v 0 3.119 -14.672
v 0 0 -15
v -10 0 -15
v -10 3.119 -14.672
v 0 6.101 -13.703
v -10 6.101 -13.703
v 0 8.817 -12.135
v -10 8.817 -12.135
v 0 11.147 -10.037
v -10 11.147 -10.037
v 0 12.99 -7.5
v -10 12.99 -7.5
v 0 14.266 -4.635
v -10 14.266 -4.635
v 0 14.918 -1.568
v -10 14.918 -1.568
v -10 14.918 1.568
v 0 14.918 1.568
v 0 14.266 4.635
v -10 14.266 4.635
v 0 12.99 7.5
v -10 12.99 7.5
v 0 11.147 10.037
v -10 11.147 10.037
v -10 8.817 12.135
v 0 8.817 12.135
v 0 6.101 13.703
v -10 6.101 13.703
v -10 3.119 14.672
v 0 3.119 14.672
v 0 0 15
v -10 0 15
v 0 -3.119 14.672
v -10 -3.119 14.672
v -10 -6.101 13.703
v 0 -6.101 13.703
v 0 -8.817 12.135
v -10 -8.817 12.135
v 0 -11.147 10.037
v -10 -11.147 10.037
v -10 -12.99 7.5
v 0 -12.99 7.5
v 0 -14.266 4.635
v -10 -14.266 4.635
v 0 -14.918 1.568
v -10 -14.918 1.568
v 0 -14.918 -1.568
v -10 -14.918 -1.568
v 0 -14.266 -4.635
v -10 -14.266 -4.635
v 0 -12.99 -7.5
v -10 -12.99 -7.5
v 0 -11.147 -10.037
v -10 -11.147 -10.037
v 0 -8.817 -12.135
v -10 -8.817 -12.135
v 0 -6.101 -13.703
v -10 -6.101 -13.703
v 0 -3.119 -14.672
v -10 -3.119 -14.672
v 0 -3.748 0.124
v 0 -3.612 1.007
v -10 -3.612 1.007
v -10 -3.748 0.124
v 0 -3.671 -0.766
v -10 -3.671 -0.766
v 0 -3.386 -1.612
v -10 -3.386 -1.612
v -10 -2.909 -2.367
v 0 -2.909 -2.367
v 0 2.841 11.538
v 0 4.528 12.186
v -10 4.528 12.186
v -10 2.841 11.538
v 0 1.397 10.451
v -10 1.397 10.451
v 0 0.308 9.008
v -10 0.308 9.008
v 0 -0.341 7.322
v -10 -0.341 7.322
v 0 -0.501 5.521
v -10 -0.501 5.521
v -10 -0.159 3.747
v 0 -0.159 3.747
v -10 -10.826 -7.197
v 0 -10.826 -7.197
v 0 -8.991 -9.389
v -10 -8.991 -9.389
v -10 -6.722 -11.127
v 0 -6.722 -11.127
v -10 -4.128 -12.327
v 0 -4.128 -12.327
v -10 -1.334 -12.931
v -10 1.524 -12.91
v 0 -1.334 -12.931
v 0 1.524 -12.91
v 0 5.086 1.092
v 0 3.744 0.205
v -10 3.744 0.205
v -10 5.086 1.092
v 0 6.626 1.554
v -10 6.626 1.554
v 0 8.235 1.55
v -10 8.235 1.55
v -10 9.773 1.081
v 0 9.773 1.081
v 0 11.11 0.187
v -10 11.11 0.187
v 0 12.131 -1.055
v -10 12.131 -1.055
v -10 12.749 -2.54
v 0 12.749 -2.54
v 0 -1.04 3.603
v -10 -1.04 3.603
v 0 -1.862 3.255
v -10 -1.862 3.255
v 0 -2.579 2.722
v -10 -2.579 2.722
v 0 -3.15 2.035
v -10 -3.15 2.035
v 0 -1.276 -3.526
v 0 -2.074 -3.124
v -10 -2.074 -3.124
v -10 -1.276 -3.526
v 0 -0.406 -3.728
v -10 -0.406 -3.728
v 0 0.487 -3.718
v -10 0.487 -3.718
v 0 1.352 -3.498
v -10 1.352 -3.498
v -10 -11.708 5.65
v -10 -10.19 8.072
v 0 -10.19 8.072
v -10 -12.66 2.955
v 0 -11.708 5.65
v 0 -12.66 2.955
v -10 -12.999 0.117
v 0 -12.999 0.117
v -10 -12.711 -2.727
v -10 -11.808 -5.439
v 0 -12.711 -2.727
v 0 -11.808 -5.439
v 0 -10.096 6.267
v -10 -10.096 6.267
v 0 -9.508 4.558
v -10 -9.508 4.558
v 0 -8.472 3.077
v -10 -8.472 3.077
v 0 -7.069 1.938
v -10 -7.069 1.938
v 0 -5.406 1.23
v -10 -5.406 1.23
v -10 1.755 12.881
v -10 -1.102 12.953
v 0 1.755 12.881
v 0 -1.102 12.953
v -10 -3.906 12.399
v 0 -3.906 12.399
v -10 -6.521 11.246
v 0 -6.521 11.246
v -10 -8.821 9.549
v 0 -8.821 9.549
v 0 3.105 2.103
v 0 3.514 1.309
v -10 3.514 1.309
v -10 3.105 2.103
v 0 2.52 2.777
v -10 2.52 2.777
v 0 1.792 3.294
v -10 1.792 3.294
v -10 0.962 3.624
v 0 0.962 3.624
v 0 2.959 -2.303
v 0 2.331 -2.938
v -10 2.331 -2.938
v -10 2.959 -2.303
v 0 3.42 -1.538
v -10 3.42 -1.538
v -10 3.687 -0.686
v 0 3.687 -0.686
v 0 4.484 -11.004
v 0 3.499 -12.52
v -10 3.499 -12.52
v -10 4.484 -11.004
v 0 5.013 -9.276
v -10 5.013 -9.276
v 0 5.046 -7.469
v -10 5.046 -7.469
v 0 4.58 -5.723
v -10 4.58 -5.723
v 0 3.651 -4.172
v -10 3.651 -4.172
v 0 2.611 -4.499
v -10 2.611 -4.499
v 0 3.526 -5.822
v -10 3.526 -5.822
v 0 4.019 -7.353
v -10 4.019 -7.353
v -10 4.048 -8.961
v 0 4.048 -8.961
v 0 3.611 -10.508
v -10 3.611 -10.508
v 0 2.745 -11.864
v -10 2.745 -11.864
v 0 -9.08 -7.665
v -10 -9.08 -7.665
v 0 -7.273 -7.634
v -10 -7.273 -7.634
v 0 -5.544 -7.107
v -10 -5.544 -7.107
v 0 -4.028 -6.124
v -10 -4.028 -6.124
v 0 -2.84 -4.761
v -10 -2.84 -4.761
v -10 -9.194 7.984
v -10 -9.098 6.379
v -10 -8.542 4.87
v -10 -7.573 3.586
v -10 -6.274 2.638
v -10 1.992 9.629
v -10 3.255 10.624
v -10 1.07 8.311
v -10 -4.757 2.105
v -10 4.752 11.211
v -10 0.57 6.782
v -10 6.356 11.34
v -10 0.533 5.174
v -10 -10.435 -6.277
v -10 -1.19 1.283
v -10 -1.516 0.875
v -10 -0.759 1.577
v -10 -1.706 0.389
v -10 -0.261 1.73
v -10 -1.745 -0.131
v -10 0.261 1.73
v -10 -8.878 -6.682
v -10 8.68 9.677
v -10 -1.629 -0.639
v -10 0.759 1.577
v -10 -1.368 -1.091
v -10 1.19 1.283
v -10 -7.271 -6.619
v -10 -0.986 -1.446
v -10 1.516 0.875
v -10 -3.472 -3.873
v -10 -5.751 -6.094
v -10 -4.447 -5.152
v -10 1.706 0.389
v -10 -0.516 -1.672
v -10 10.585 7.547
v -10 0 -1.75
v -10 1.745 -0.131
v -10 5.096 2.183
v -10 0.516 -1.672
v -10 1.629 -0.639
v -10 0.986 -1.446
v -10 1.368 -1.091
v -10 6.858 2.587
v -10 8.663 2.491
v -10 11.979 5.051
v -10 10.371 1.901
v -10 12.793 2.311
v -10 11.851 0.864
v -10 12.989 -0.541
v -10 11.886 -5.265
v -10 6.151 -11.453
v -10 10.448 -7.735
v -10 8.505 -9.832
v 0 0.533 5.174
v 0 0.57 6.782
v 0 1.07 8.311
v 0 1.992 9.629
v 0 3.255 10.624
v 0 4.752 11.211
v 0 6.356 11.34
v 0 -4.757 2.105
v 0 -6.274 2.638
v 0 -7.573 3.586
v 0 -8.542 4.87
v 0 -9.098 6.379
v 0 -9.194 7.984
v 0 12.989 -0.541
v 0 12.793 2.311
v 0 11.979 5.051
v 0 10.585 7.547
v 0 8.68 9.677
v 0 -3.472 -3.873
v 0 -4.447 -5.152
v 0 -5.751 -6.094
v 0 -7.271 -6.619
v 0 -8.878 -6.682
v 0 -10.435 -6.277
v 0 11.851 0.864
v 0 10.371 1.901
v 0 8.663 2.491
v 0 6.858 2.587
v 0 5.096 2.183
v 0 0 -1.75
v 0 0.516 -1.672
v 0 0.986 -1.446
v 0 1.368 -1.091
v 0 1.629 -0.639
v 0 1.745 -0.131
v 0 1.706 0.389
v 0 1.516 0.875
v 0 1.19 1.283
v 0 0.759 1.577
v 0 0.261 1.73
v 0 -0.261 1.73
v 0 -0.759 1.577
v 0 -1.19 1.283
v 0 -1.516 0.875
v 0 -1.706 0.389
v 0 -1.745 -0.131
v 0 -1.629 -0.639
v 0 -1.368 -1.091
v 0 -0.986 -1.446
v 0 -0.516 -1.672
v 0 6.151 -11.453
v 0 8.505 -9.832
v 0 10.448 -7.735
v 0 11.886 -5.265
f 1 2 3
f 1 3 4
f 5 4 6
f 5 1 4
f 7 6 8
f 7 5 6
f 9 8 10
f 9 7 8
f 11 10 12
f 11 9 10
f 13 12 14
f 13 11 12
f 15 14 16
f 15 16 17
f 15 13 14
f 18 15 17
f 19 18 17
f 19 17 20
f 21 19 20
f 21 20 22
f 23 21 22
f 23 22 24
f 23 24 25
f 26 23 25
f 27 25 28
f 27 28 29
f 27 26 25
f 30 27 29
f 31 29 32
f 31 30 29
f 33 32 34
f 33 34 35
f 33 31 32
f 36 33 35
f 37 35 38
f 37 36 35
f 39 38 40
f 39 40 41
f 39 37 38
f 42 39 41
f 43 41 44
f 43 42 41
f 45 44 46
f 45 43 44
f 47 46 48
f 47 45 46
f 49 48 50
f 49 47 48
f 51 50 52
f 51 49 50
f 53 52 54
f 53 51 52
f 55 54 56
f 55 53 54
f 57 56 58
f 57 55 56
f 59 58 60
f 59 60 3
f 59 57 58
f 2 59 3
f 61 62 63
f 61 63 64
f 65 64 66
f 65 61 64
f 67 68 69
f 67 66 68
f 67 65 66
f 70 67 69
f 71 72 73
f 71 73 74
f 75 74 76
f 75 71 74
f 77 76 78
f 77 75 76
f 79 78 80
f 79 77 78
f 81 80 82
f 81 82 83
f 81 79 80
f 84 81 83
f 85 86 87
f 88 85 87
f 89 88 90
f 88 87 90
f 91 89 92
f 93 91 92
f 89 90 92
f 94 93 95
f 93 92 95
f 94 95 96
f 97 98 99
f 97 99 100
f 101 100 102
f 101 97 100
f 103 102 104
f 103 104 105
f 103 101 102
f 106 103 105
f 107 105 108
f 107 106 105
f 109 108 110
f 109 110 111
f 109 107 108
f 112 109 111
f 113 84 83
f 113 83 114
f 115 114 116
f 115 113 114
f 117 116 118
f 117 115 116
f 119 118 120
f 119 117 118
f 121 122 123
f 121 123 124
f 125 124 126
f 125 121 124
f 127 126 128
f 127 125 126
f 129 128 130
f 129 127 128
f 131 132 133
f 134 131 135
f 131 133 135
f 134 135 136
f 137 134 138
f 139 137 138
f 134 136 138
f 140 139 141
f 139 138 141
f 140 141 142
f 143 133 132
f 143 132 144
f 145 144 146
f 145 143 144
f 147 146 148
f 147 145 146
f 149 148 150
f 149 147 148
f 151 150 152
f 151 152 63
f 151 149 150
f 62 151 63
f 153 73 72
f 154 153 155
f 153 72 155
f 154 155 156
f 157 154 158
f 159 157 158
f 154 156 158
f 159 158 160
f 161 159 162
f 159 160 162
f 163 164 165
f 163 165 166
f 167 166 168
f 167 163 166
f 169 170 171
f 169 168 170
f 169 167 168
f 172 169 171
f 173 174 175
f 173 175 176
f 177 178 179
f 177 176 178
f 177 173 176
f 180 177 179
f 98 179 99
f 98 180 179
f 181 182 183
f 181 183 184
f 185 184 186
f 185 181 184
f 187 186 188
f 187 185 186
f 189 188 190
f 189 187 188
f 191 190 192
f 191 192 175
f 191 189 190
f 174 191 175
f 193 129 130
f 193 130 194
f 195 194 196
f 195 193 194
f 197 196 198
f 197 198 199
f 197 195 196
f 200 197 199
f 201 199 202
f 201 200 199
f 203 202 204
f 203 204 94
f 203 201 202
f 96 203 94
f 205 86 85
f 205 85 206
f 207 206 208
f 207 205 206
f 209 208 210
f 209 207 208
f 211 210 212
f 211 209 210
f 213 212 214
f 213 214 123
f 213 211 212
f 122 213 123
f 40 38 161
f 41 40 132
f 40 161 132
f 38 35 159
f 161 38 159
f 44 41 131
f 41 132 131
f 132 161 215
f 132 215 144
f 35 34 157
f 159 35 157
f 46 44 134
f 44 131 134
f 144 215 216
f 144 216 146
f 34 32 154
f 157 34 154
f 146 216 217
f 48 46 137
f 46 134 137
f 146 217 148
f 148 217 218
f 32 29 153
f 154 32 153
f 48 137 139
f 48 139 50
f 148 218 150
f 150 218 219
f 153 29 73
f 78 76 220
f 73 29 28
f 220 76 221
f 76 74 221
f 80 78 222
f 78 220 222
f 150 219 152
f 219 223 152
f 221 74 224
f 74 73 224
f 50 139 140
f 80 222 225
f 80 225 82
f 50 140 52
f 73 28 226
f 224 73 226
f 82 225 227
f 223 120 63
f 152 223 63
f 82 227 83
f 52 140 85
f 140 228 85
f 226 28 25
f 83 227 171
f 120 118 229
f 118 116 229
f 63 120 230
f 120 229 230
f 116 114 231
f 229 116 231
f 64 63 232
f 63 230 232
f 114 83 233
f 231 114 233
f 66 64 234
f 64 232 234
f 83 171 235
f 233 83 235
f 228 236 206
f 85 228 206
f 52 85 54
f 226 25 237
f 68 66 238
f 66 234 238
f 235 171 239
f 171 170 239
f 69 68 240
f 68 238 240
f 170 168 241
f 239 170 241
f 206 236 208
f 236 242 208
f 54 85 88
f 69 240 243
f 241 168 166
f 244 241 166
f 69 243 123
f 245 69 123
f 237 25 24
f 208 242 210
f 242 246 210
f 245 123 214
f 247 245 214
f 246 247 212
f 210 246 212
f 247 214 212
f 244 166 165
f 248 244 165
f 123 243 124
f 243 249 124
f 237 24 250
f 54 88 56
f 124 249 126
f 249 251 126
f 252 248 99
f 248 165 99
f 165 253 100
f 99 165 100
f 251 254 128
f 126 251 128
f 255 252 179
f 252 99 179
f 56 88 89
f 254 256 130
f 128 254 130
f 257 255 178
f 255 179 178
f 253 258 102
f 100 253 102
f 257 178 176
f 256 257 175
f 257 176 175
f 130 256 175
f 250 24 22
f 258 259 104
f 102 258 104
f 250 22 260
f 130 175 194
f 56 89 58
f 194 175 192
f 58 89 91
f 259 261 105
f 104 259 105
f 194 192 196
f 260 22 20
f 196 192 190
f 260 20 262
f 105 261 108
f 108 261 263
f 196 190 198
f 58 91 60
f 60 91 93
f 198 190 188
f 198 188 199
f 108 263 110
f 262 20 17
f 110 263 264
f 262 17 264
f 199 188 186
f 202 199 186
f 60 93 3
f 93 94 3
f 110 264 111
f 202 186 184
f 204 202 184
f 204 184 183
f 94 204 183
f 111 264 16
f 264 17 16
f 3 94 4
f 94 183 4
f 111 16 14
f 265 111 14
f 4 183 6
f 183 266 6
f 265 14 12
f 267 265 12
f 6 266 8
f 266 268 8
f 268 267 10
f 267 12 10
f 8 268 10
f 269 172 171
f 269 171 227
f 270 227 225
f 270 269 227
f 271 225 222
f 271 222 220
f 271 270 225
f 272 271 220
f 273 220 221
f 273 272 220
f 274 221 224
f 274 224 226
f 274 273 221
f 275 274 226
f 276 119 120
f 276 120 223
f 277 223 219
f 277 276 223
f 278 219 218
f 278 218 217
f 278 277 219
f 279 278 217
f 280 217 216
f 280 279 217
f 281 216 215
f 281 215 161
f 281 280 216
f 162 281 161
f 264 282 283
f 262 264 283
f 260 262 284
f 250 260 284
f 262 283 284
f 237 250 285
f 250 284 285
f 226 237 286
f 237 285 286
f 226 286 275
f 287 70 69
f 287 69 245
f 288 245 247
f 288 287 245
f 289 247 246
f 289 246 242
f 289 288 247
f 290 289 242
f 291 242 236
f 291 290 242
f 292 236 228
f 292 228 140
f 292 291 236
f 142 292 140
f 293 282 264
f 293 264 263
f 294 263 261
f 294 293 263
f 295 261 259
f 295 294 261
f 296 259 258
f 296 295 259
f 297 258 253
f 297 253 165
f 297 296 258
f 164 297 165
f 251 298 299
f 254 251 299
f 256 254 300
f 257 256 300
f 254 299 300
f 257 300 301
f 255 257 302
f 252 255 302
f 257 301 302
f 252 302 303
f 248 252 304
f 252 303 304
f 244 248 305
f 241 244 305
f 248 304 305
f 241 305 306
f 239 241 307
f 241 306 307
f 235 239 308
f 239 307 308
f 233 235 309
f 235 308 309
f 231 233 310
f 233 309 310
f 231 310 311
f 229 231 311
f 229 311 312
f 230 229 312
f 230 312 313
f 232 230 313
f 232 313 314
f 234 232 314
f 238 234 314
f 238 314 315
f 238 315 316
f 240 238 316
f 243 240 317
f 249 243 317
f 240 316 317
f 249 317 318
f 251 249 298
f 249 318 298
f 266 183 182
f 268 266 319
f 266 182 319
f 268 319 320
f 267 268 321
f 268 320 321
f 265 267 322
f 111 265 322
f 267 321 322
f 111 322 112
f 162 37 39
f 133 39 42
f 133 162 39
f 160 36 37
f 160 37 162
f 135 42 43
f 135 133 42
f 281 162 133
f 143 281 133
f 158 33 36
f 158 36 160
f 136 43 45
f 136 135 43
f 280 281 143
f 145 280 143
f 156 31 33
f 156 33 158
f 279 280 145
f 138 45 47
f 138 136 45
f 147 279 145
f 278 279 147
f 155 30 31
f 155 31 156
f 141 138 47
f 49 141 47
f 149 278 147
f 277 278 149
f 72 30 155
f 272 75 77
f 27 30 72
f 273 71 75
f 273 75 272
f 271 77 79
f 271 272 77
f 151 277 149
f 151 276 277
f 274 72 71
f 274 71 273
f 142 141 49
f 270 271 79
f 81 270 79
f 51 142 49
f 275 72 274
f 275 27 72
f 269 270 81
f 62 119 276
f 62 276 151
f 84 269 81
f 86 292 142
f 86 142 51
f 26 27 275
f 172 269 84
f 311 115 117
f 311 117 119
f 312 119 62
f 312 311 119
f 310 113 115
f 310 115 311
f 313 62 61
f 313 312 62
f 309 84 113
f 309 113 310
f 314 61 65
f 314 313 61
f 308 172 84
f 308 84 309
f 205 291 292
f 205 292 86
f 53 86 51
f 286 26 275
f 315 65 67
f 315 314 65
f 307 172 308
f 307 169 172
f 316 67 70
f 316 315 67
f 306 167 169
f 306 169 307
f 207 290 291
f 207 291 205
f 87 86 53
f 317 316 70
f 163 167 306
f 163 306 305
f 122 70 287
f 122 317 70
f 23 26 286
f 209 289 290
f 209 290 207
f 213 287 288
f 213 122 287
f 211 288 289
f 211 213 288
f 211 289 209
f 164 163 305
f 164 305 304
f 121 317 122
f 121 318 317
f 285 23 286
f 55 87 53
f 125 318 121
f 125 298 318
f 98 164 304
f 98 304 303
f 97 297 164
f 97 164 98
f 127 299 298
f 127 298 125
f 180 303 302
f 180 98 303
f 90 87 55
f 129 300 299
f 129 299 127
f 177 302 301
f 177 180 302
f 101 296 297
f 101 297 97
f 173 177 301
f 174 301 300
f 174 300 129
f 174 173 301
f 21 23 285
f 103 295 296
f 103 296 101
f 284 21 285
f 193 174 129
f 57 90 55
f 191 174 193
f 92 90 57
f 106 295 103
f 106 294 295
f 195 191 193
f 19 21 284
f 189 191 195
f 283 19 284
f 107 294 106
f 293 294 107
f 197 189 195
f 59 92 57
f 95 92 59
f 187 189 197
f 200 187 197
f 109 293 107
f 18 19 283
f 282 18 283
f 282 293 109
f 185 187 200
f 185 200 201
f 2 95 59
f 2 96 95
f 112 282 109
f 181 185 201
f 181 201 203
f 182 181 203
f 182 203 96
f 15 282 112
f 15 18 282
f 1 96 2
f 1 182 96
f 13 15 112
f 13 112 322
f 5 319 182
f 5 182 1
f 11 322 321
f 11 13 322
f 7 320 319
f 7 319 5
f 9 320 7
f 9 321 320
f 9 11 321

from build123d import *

# Parameters (mm, degrees)
SKETCH1_R           = 3.75
SKETCH1_R_2         = 1.75
BOSS_EXTRUDE1_DEPTH = 10
SKETCH2_R           = 15
SKETCH2_R_2         = 13
BOSS_EXTRUDE2_DEPTH = 10
BOSS_EXTRUDE3_DEPTH = 10
CIRPATTERN1_COUNT   = 5


with BuildPart() as part:
    # Sketch1 → Boss-Extrude1 (new body)
    with BuildSketch(Plane(origin=(0, 0, 0), x_dir=(0, 0, -1), z_dir=(1, 0, 0))):
        Circle(SKETCH1_R)
        Circle(SKETCH1_R_2, mode=Mode.SUBTRACT)
    extrude(amount=-BOSS_EXTRUDE1_DEPTH)



with BuildPart() as body_2:
    # Sketch2 → Boss-Extrude2 (new body)
    with BuildSketch(Plane(origin=(0, 0, 0), x_dir=(0, 0, -1), z_dir=(1, 0, 0))):
        Circle(SKETCH2_R)
        Circle(SKETCH2_R_2, mode=Mode.SUBTRACT)
    extrude(amount=-BOSS_EXTRUDE2_DEPTH)


with BuildPart() as part_1:
    add(part.part)

    add(body_2.part)  # Boss-Extrude3 merges body 2
    # Sketch3 → Boss-Extrude3 (add)
    with BuildSketch(Plane(origin=(0, 0, 0), x_dir=(0, 0, -1), z_dir=(1, 0, 0))):
        with BuildLine():
            ThreePointArc((-12.185926249, 4.528046097), (-9.008421397, 0.308117229), (-3.746637972, -0.158757395))
            ThreePointArc((-3.746637972, -0.158757395), (-3.727921816, 0.406323685), (-3.624463026, 0.962168268))
            ThreePointArc((-3.624463026, 0.962168268), (-9.003588829, 1.482702332), (-11.340490704, 6.355570045))
            ThreePointArc((-11.340490704, 6.355570045), (-11.798645456, 5.458201663), (-12.185926249, 4.528046097))
        make_face()
    boss_extrude3 = extrude(amount=-BOSS_EXTRUDE3_DEPTH)

    # CirPattern1: Boss-Extrude3 ×5 about axis
    cirpattern1_axis = Axis((0, 0, 0), (1, 0, 0))
    for i in range(1, CIRPATTERN1_COUNT):
        add(boss_extrude3.rotate(cirpattern1_axis, i * 360 / CIRPATTERN1_COUNT))


solid = part_1.part
